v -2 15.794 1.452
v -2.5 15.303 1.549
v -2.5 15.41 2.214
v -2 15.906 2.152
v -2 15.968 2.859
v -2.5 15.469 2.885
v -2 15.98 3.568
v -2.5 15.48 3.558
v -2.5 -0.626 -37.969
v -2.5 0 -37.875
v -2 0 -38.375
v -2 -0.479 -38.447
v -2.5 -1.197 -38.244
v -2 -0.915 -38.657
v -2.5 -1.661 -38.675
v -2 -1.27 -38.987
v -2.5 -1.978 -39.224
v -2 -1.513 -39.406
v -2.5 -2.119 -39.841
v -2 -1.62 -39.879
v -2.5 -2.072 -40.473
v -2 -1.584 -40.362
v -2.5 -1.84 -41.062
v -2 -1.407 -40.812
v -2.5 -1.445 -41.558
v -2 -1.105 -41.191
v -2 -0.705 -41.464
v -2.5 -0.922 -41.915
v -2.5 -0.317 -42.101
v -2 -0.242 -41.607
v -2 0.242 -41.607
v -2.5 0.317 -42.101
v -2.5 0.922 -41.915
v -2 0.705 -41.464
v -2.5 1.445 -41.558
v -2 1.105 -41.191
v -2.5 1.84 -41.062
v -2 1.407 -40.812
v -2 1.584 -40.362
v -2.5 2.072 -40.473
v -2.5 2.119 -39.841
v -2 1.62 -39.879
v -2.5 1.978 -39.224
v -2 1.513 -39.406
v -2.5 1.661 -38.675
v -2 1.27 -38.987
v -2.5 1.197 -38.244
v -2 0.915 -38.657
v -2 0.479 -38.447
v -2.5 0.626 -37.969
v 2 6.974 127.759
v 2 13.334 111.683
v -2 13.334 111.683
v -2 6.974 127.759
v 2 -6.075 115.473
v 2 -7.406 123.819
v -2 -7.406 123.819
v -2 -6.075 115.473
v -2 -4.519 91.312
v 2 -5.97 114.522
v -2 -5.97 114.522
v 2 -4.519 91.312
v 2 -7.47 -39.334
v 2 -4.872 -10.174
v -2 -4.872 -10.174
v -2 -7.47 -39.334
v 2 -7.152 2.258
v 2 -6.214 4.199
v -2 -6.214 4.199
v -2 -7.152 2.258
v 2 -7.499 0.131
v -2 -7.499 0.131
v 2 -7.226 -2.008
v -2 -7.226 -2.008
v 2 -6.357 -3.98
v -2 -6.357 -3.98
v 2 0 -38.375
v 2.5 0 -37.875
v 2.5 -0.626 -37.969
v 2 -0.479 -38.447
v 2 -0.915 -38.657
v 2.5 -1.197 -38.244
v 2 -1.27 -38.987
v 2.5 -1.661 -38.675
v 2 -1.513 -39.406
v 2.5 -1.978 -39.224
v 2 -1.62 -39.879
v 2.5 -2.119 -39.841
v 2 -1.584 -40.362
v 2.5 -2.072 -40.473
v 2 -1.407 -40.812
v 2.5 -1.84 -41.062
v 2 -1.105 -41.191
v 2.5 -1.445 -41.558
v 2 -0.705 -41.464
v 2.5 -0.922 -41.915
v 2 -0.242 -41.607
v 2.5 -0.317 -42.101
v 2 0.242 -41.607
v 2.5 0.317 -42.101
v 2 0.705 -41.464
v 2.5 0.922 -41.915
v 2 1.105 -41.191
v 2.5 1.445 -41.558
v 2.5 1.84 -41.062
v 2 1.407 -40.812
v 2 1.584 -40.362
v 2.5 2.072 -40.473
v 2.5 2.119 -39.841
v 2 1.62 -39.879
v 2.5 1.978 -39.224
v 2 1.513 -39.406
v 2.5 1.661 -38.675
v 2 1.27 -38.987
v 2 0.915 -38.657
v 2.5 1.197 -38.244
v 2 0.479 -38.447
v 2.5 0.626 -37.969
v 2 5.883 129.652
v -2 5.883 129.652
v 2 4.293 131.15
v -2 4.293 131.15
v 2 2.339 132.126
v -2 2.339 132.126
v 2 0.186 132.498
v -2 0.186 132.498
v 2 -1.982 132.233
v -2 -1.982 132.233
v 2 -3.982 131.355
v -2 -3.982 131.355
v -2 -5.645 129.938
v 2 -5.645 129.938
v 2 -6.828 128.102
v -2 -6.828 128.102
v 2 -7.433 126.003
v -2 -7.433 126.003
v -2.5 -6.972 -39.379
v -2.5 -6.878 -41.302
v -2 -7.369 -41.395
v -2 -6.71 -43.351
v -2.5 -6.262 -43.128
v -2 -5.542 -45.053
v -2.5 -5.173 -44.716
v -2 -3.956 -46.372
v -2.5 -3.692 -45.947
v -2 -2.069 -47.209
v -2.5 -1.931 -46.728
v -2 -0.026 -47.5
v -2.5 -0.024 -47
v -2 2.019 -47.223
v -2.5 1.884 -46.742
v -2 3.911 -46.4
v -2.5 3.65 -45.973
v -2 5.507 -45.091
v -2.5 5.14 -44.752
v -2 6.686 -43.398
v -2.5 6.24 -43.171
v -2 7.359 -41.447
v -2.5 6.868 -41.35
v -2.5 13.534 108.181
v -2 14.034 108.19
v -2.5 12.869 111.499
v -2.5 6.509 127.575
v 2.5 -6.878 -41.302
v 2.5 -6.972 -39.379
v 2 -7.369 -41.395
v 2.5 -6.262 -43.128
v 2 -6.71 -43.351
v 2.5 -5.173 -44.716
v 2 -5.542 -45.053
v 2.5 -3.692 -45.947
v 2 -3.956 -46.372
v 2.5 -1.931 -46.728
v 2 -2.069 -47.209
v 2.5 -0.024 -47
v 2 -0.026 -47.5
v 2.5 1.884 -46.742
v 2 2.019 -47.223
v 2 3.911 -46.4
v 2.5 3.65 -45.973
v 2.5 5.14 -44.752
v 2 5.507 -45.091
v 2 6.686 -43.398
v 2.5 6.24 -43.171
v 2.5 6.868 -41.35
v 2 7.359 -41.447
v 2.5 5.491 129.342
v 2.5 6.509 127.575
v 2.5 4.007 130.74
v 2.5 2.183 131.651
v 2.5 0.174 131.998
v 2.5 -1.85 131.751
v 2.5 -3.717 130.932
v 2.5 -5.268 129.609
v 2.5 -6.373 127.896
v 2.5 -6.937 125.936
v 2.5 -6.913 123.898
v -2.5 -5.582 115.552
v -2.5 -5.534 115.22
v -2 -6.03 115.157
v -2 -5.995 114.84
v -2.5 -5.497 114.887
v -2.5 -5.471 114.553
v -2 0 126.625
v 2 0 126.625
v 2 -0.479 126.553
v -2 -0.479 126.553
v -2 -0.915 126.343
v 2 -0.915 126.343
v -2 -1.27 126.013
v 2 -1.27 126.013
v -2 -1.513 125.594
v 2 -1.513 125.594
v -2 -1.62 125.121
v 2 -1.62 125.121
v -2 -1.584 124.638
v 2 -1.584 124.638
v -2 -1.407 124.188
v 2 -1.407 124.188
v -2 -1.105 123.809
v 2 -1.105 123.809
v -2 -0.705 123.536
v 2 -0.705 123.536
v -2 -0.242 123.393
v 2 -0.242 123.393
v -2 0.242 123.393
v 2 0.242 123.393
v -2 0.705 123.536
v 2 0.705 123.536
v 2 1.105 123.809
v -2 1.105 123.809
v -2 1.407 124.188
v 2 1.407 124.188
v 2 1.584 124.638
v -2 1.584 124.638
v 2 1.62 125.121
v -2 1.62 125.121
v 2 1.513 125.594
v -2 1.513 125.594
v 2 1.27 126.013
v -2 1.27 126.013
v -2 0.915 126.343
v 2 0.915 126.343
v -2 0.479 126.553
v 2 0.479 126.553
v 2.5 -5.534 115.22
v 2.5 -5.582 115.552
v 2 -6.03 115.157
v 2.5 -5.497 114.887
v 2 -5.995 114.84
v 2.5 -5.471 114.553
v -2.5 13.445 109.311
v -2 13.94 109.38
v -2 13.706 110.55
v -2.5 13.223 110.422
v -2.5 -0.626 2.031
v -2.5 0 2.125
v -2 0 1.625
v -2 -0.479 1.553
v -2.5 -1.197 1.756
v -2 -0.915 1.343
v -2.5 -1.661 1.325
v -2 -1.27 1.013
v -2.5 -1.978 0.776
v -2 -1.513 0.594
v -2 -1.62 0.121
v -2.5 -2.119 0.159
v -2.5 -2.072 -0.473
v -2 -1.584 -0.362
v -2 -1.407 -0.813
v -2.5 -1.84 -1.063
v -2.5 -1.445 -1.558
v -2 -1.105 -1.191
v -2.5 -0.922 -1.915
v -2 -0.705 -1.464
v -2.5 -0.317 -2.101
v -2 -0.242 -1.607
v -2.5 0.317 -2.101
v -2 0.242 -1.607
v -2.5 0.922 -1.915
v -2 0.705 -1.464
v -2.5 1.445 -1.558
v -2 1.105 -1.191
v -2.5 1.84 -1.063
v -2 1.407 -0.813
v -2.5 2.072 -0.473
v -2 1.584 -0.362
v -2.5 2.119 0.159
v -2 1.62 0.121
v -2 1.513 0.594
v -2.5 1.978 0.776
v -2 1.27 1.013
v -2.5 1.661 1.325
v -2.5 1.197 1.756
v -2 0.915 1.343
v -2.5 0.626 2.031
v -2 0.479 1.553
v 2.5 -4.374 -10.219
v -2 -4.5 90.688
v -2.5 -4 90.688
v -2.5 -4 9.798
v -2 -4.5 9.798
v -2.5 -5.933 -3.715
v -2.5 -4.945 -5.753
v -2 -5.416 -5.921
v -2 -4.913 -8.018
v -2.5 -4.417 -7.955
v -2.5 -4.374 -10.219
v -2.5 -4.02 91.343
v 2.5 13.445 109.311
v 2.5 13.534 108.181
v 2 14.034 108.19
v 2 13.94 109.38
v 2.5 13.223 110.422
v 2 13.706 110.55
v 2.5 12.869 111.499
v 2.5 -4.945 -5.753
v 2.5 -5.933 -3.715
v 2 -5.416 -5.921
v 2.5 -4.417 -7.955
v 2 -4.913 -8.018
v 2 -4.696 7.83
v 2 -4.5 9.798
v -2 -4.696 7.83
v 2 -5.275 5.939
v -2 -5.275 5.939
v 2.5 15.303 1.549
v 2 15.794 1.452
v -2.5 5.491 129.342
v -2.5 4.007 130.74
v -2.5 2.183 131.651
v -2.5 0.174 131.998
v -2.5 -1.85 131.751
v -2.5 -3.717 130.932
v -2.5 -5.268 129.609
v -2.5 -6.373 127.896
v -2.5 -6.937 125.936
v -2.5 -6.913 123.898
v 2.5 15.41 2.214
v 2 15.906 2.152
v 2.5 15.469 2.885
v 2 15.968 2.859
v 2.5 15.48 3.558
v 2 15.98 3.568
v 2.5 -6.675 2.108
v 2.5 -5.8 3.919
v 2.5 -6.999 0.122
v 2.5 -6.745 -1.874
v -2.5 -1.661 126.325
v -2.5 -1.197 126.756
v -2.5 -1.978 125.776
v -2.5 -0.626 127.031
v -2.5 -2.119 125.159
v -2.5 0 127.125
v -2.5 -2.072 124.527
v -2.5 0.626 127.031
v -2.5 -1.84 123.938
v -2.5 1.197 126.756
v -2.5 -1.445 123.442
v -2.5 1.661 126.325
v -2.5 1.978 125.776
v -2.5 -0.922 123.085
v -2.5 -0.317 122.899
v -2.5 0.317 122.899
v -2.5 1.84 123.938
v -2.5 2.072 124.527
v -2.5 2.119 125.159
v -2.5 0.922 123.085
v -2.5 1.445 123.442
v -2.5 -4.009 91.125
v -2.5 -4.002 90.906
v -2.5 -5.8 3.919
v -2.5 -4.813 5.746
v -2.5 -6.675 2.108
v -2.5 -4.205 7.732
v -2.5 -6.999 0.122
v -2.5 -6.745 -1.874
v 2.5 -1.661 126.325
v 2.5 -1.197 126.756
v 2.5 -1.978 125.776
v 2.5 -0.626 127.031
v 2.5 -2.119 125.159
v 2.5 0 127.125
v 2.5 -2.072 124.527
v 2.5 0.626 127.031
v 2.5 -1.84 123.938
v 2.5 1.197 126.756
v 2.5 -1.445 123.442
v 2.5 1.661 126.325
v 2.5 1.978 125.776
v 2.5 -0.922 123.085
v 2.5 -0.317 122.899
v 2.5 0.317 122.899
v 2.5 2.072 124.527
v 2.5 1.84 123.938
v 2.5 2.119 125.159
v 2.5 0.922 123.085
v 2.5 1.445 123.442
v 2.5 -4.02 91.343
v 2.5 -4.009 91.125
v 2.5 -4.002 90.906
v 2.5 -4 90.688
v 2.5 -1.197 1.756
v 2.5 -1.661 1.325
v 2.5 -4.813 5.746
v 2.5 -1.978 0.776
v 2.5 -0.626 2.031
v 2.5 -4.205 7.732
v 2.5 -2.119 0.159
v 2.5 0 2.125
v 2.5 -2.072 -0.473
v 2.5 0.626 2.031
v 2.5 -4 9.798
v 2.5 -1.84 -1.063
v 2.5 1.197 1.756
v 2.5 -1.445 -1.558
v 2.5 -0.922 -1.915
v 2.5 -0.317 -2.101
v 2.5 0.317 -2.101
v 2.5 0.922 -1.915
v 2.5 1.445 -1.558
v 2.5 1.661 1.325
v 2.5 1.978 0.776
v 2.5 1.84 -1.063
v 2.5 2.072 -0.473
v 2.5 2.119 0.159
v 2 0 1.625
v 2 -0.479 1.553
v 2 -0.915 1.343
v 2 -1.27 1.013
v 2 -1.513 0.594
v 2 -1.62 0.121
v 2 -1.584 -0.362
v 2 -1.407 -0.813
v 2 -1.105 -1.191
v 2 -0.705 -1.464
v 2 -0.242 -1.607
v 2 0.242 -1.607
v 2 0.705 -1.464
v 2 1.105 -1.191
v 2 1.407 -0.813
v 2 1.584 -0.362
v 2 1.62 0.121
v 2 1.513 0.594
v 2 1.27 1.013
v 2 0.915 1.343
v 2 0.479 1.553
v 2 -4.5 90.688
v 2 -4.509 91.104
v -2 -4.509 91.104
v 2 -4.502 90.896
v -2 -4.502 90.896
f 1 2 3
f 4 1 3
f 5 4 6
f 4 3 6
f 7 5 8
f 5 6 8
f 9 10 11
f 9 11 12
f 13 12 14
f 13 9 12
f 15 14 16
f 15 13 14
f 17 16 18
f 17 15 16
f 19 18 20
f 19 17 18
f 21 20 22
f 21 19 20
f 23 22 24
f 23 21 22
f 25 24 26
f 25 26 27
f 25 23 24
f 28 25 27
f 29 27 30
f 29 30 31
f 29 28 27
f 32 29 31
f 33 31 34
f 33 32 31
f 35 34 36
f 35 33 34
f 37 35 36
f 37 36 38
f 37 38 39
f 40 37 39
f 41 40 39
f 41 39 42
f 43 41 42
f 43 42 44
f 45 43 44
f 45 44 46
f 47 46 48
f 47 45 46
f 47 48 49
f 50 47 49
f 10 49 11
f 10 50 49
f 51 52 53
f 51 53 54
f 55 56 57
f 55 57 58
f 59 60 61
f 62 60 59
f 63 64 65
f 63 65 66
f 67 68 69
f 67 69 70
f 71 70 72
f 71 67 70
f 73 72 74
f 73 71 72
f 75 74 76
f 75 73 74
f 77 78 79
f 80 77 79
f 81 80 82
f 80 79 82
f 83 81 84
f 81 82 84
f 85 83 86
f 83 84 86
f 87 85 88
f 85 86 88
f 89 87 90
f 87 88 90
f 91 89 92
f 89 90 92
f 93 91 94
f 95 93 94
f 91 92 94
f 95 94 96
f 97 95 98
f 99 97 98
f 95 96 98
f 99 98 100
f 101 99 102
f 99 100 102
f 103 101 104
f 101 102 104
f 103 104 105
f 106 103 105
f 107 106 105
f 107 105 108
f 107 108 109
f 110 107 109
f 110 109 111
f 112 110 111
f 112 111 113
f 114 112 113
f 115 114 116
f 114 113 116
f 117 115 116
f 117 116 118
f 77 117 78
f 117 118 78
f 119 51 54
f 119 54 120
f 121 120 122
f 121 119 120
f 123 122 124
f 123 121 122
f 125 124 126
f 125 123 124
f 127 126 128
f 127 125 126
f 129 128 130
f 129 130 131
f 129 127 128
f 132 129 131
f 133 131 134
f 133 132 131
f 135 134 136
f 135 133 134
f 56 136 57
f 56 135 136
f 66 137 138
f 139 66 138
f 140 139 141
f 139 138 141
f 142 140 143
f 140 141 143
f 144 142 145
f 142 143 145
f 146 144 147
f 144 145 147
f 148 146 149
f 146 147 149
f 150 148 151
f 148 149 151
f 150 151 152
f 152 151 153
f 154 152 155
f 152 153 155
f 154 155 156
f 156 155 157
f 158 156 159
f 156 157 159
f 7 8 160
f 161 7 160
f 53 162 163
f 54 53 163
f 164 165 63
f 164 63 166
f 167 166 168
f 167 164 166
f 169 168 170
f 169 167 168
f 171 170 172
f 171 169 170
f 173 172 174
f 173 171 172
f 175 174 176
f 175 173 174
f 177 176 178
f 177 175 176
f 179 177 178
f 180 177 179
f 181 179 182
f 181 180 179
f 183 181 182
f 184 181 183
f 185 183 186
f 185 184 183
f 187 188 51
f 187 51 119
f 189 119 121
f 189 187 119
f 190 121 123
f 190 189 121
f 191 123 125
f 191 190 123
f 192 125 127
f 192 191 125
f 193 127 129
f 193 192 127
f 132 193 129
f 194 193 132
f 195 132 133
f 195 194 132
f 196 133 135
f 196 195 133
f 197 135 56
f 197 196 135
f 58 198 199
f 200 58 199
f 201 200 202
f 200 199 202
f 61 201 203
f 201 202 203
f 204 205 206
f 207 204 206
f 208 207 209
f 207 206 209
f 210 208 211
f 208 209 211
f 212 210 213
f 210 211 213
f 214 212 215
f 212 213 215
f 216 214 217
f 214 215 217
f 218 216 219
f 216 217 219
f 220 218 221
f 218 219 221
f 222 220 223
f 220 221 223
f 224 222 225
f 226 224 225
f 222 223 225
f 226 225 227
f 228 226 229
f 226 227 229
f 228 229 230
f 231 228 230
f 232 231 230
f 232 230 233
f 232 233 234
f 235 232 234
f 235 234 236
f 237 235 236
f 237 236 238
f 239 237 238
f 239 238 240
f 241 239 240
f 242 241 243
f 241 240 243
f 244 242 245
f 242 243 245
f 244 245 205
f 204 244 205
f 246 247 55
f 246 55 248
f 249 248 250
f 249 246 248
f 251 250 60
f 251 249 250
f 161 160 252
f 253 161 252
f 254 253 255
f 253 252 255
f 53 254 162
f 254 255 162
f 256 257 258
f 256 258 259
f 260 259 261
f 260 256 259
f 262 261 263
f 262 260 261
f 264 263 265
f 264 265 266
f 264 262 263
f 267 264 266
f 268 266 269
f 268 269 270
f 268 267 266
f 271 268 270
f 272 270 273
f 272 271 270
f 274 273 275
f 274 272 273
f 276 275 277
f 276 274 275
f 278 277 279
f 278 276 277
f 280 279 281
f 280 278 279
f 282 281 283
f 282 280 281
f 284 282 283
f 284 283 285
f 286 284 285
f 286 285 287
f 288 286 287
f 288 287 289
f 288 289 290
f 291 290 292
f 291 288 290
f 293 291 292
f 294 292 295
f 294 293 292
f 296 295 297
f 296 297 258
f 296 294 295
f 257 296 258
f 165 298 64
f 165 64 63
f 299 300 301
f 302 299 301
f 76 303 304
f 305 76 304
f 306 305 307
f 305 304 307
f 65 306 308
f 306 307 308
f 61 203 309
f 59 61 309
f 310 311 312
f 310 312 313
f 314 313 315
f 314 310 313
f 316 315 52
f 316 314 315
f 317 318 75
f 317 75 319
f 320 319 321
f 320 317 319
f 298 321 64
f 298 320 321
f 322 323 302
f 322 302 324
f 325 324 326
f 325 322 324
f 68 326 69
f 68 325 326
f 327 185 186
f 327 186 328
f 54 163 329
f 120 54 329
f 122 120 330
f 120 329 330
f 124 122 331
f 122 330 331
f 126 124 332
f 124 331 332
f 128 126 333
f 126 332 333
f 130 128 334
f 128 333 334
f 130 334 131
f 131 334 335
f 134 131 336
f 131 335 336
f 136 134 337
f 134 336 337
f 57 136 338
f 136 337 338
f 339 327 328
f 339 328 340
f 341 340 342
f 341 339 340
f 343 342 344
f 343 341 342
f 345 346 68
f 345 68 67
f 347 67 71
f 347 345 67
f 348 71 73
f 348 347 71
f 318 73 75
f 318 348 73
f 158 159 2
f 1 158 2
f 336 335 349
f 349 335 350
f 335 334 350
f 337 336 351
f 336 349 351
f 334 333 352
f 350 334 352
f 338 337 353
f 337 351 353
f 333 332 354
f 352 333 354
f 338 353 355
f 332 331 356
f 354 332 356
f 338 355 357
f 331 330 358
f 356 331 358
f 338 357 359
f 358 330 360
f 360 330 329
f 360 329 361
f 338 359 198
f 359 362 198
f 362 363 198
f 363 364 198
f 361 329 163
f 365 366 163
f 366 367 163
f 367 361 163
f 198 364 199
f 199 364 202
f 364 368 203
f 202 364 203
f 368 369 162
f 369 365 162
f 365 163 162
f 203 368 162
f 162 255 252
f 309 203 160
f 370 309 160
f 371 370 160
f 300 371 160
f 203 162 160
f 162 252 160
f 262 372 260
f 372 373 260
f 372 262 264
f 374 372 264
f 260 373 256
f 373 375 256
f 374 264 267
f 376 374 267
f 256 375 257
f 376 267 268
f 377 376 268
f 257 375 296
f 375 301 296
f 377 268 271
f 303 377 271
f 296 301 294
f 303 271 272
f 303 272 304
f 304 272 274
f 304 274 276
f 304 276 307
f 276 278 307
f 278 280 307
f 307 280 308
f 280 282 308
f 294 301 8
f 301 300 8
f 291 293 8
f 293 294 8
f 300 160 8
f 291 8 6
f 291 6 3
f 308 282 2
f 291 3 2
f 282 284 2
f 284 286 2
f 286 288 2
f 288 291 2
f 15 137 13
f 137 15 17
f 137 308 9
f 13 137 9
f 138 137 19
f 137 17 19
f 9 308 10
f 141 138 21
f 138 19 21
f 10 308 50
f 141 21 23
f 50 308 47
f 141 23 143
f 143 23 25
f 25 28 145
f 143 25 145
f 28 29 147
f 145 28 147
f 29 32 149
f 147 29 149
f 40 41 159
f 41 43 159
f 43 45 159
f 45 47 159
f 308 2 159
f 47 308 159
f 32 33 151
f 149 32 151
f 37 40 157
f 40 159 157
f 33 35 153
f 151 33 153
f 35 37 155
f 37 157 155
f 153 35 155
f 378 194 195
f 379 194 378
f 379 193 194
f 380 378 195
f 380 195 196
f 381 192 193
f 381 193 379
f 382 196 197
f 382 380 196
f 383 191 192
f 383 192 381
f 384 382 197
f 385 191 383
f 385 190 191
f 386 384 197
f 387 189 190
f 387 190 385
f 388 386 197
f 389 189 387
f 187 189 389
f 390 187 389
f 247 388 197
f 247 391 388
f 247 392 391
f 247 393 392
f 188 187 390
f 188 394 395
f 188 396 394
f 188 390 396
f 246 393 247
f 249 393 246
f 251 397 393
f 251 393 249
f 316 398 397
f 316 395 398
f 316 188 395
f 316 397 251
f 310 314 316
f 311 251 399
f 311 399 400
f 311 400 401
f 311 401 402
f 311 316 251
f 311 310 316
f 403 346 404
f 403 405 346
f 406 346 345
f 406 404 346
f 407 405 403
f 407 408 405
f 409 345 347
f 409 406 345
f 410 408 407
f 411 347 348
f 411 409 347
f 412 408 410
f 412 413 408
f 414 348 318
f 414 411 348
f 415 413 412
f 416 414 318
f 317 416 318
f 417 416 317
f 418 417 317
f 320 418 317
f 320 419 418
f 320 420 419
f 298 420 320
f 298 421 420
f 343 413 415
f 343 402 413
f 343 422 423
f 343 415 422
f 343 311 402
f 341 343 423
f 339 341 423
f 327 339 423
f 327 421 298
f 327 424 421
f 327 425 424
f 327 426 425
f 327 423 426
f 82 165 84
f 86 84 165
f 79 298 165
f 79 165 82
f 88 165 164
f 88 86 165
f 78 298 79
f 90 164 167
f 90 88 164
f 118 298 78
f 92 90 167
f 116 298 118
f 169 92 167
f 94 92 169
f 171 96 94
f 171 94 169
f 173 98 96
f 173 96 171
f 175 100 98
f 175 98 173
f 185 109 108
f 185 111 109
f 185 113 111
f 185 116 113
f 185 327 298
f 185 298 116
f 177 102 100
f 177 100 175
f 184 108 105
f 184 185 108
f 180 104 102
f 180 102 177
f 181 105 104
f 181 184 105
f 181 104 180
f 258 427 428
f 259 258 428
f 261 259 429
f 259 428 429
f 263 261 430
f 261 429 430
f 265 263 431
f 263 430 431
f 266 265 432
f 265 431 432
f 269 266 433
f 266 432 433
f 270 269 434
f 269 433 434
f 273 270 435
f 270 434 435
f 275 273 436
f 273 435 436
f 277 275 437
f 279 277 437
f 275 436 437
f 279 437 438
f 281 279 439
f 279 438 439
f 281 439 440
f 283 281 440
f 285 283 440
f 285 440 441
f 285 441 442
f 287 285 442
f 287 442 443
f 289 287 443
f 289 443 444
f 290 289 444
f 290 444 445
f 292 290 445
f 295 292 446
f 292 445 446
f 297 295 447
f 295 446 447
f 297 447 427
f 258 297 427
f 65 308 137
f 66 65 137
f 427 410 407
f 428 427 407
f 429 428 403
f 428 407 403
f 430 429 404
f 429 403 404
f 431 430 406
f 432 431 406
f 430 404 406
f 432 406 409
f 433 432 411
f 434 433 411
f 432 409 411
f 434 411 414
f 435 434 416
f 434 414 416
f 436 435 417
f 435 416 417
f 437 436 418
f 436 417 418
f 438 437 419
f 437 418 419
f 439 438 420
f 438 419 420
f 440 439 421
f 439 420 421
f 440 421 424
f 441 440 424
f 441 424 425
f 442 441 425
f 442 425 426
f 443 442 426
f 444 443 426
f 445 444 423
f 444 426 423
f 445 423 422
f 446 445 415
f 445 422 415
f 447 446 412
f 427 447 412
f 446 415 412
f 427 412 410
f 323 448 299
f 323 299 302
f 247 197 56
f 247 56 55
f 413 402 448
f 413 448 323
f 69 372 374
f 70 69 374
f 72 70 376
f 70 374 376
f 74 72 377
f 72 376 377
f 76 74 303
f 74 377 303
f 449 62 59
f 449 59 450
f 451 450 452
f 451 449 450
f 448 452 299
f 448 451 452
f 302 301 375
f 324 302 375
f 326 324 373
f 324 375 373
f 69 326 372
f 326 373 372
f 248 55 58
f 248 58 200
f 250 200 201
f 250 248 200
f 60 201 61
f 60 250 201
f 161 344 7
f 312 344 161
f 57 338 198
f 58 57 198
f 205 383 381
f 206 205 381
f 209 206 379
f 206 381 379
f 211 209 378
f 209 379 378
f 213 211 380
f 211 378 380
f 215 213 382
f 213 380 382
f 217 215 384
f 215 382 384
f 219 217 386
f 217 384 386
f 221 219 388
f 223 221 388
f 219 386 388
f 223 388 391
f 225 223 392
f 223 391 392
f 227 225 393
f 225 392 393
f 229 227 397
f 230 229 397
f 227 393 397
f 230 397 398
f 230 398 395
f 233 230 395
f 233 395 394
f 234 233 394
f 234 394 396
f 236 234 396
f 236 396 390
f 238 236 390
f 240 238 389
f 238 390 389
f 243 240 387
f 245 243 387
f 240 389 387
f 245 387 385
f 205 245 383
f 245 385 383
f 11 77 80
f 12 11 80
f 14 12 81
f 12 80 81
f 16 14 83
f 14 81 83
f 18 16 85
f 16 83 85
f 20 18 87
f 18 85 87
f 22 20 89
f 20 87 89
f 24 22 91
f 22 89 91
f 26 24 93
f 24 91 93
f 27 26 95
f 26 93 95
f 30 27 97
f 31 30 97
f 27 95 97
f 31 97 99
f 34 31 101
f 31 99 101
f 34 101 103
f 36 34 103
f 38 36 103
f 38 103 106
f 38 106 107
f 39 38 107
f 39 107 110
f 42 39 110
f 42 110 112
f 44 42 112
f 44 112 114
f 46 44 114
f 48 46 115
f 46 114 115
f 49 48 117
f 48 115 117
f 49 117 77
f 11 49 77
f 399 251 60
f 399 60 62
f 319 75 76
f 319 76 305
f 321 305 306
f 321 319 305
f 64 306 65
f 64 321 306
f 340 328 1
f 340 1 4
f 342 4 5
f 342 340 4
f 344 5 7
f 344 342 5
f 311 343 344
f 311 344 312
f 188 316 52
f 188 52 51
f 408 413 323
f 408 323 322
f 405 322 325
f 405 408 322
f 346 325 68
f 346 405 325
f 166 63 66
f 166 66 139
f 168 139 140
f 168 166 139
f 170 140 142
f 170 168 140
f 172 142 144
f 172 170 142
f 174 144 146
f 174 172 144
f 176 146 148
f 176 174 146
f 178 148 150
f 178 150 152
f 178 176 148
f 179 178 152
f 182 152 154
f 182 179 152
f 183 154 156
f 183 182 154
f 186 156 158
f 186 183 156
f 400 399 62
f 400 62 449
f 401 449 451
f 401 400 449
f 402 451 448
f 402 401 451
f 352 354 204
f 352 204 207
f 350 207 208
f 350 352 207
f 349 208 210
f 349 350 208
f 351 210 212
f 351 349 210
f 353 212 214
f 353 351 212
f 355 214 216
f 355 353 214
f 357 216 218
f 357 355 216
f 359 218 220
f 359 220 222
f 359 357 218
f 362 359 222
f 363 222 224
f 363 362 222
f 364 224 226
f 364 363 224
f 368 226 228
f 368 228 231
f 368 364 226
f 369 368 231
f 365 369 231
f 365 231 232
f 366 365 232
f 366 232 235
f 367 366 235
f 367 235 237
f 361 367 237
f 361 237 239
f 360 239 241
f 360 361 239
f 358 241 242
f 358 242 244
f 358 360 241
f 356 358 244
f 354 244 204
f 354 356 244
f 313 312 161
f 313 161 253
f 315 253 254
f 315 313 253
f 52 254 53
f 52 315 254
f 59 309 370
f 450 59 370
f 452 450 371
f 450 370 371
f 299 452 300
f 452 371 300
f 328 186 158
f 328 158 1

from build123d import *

# Parameters (mm, degrees)
SKETCH_1_R          = 1.625
SKETCH_1_R_2        = 1.575
EXTRUDE_1_DEPTH     = 5
CHAMFER_1_SIZE      = 0.5
CUT_EXTRUDE_1_DEPTH = 10
FILLET_1_R          = 1.8
CHAMFER_2_SIZE      = 0.5
EXTRUDE_2_DEPTH     = 5


with BuildPart() as part:
    # 草图1 → 凸台-拉伸1 (new body)
    with BuildSketch(Plane(origin=(2.5, 0, 0), x_dir=(0, 0, -1), z_dir=(1, 0, 0))):
        with BuildLine():
            Line((10.174472616, -4.871984543), (39.334317565, -7.47039938))
            ThreePointArc((39.334317565, -7.47039938), (47.425031601, -1.057783404), (41.446954522, 7.359097948))
            Line((41.446954522, 7.359097948), (-1.452294145, 15.793998839))
            ThreePointArc((-1.452294145, 15.793998839), (-2.504982909, 15.943374182), (-3.567581162, 15.980138025))
            Line((-3.567581162, 15.980138025), (-108.190291563, 14.033668994))
            ThreePointArc((-108.190291563, 14.033668994), (-109.968090242, 13.840675264), (-111.68308982, 13.334126973))
            Line((-111.68308982, 13.334126973), (-127.759109434, 6.974045822))
            ThreePointArc((-127.759109434, 6.974045822), (-132.233383985, -1.981957648), (-123.818844483, -7.406407472))
            Line((-123.818844483, -7.406407472), (-115.473023263, -6.075436578))
            ThreePointArc((-115.473023263, -6.075436578), (-114.998738119, -6.011395859), (-114.521932102, -5.970120756))
            Line((-114.521932102, -5.970120756), (-91.311587443, -4.519474215))
            ThreePointArc((-91.311587443, -4.519474215), (-90.999847969, -4.50486974), (-90.687804581, -4.5))
            Line((-90.687804581, -4.5), (-9.797958971, -4.5))
            ThreePointArc((-9.797958971, -4.5), (-6.870258752, -4.938171125), (-4.199125273, -6.214285714))
            ThreePointArc((-4.199125273, -6.214285714), (-0.130653307, -7.498861895), (3.980098301, -6.356793021))
            ThreePointArc((3.980098301, -6.356793021), (6.955899906, -5.107988421), (10.174472616, -4.871984543))
        make_face()
        with Locations(Location((-125, 0, 0), (0, 0, 180))):
            Circle(SKETCH_1_R, mode=Mode.SUBTRACT)
        with Locations(Location((0, 0, 0), (0, 0, 180))):
            Circle(SKETCH_1_R, mode=Mode.SUBTRACT)
        with Locations(Location((-106.5, 5, 0), (0, 0, 180))):
            Circle(SKETCH_1_R_2, mode=Mode.SUBTRACT)
        with Locations(Location((-23.5, 8.5, 0), (0, 0, 180))):
            Circle(SKETCH_1_R_2, mode=Mode.SUBTRACT)
        with Locations(Location((40, 0, 0), (0, 0, 180))):
            Circle(SKETCH_1_R, mode=Mode.SUBTRACT)
        with BuildLine():
            Line((-97.531579662, 6.980715987), (-32.542826067, 8.189809077))
            ThreePointArc((-32.542826067, 8.189809077), (-30.505969245, 6.227357985), (-32.468420338, 4.190501164))
            Line((-32.468420338, 4.190501164), (-97.457173933, 2.981408074))
            ThreePointArc((-97.457173933, 2.981408074), (-99.494030755, 4.943859166), (-97.531579662, 6.980715987))
        make_face(mode=Mode.SUBTRACT)
    extrude(amount=-EXTRUDE_1_DEPTH)

    # 倒角1
    chamfer_1_edges = [part.edges().sort_by_distance(p)[0] for p in [
        (-2.5, -1.057783404, -47.425031601),
        (2.5, -7.498861895, 0.130653307),
        (2.5, -4.938171125, 6.870258752),
        (2.5, -4.5, 50.242881776),
        (-2.5, 11.576548393, -19.997330188),
        (2.5, -4.50486974, 90.999847969),
        (2.5, -5.244797486, 102.916759772),
        (2.5, -6.011395859, 114.998738119),
        (2.5, -6.740922025, 119.645933873),
        (2.5, -1.981957648, 132.233383985),
        (2.5, 10.154086398, 119.721099627),
        (2.5, 13.840675264, 109.968090242),
        (2.5, 15.00690351, 55.878936363),
        (2.5, 15.943374182, 2.504982909),
        (2.5, 11.576548393, -19.997330188),
        (-2.5, 15.943374182, 2.504982909),
        (2.5, -1.057783404, -47.425031601),
        (2.5, -6.171191961, -24.754395091),
        (2.5, -5.107988421, -6.955899906),
        (-2.5, 15.00690351, 55.878936363),
        (-2.5, 13.840675264, 109.968090242),
        (-2.5, 10.154086398, 119.721099627),
        (-2.5, -1.981957648, 132.233383985),
        (-2.5, 0, 123.375),
        (2.5, 0, 123.375),
        (-2.5, -6.740922025, 119.645933873),
        (-2.5, 0, -1.625),
        (2.5, 0, -1.625),
        (-2.5, -6.011395859, 114.998738119),
        (-2.5, -5.244797486, 102.916759772),
        (-2.5, -5.107988421, -6.955899906),
        (-2.5, 4.943859166, 99.494030755),
        (-2.5, 7.585262532, 65.037202864),
        (-2.5, 6.227357985, 30.505969245),
        (-2.5, 3.585954619, 64.962797136),
        (2.5, 4.943859166, 99.494030755),
        (2.5, 3.585954619, 64.962797136),
        (2.5, 6.227357985, 30.505969245),
        (-2.5, -4.50486974, 90.999847969),
        (2.5, 7.585262532, 65.037202864),
        (-2.5, -4.5, 50.242881776),
        (-2.5, 5, 104.925),
        (-2.5, -4.938171125, 6.870258752),
        (2.5, 5, 104.925),
        (-2.5, 8.5, 21.925),
        (2.5, 8.5, 21.925),
        (-2.5, -7.498861895, 0.130653307),
        (-2.5, 0, -41.625),
        (2.5, 0, -41.625),
        (-2.5, -6.171191961, -24.754395091),
    ]]
    chamfer(chamfer_1_edges, length=CHAMFER_1_SIZE)

    # Sketch 3D_1 → 切除-拉伸1 (cut)
    with BuildSketch(Plane(origin=(-2.5, 5.468748942, -29.149920979), x_dir=(0, 0.09600082768489282, 0.9953812541352262), z_dir=(-1, 0, 0))):
        Polygon((0, 0), (36.636192851, 3.601725733), (36.990280632, 0), (0.354087782, -3.601725733), align=None)
    extrude(amount=-CUT_EXTRUDE_1_DEPTH, mode=Mode.SUBTRACT)

    # 圆角1
    fillet_1_edges = [part.edges().sort_by_distance(p)[0] for p in [
        (0, 1.917651385, -28.451699987),
        (0, 5.468748942, -29.149920979),
        (0, 9.019846499, 7.669510948),
        (0, 12.570944056, 6.971289956),
    ]]
    fillet(fillet_1_edges, radius=FILLET_1_R)

    # 倒角2
    chamfer_2_edges = [part.edges().sort_by_distance(p)[0] for p in [
        (-2.5, 3.693200164, -28.800810483),
        (2.5, 3.693200164, -28.800810483),
        (-2.5, 5.468748942, -10.391094519),
        (2.5, 5.468748942, -10.391094519),
        (-2.5, 9.019846499, -11.089315511),
        (2.5, 9.019846499, -11.089315511),
        (-2.5, 10.795395278, 7.320400452),
        (2.5, 10.795395278, 7.320400452),
        (2.5, 2.536667318, -28.036109575),
        (-2.5, 2.536667318, -28.036109575),
        (2.5, 5.05315853, -28.530905046),
        (-2.5, 5.05315853, -28.530905046),
        (2.5, 9.435436911, 7.050495015),
        (-2.5, 9.435436911, 7.050495015),
        (2.5, 11.951928123, 6.555699544),
        (-2.5, 11.951928123, 6.555699544),
    ]]
    chamfer(chamfer_2_edges, length=CHAMFER_2_SIZE)

    # Sketch 3D_2 → 凸台-拉伸2 (add)
    with BuildSketch(Plane(origin=(-2.5, 6.354785771, -31.987998048), x_dir=(0, -0.04894175340151768, 0.9988016343468732), z_dir=(-1, 0, 0))):
        Polygon((0, 0), (12.737020213, 4.501231483), (35.673238201, 9.911480997), (42.944661229, 8.12460219), (37.299631195, 0.841435049), (21.568572182, -2.869244472), (5.067736736, -6.761500685), align=None)
        Polygon((63.094756945, -1.716239027), (130.07937311, -0.635871261), (143.056212123, 0), (141.536284317, 10.812456461), (76.338246536, 9.760903695), (52.568858227, 8.596192404), (48.259357211, 3.036112827), (48.527202079, -2.430056119), align=None)
    extrude(amount=-EXTRUDE_2_DEPTH)


solid = part.part
